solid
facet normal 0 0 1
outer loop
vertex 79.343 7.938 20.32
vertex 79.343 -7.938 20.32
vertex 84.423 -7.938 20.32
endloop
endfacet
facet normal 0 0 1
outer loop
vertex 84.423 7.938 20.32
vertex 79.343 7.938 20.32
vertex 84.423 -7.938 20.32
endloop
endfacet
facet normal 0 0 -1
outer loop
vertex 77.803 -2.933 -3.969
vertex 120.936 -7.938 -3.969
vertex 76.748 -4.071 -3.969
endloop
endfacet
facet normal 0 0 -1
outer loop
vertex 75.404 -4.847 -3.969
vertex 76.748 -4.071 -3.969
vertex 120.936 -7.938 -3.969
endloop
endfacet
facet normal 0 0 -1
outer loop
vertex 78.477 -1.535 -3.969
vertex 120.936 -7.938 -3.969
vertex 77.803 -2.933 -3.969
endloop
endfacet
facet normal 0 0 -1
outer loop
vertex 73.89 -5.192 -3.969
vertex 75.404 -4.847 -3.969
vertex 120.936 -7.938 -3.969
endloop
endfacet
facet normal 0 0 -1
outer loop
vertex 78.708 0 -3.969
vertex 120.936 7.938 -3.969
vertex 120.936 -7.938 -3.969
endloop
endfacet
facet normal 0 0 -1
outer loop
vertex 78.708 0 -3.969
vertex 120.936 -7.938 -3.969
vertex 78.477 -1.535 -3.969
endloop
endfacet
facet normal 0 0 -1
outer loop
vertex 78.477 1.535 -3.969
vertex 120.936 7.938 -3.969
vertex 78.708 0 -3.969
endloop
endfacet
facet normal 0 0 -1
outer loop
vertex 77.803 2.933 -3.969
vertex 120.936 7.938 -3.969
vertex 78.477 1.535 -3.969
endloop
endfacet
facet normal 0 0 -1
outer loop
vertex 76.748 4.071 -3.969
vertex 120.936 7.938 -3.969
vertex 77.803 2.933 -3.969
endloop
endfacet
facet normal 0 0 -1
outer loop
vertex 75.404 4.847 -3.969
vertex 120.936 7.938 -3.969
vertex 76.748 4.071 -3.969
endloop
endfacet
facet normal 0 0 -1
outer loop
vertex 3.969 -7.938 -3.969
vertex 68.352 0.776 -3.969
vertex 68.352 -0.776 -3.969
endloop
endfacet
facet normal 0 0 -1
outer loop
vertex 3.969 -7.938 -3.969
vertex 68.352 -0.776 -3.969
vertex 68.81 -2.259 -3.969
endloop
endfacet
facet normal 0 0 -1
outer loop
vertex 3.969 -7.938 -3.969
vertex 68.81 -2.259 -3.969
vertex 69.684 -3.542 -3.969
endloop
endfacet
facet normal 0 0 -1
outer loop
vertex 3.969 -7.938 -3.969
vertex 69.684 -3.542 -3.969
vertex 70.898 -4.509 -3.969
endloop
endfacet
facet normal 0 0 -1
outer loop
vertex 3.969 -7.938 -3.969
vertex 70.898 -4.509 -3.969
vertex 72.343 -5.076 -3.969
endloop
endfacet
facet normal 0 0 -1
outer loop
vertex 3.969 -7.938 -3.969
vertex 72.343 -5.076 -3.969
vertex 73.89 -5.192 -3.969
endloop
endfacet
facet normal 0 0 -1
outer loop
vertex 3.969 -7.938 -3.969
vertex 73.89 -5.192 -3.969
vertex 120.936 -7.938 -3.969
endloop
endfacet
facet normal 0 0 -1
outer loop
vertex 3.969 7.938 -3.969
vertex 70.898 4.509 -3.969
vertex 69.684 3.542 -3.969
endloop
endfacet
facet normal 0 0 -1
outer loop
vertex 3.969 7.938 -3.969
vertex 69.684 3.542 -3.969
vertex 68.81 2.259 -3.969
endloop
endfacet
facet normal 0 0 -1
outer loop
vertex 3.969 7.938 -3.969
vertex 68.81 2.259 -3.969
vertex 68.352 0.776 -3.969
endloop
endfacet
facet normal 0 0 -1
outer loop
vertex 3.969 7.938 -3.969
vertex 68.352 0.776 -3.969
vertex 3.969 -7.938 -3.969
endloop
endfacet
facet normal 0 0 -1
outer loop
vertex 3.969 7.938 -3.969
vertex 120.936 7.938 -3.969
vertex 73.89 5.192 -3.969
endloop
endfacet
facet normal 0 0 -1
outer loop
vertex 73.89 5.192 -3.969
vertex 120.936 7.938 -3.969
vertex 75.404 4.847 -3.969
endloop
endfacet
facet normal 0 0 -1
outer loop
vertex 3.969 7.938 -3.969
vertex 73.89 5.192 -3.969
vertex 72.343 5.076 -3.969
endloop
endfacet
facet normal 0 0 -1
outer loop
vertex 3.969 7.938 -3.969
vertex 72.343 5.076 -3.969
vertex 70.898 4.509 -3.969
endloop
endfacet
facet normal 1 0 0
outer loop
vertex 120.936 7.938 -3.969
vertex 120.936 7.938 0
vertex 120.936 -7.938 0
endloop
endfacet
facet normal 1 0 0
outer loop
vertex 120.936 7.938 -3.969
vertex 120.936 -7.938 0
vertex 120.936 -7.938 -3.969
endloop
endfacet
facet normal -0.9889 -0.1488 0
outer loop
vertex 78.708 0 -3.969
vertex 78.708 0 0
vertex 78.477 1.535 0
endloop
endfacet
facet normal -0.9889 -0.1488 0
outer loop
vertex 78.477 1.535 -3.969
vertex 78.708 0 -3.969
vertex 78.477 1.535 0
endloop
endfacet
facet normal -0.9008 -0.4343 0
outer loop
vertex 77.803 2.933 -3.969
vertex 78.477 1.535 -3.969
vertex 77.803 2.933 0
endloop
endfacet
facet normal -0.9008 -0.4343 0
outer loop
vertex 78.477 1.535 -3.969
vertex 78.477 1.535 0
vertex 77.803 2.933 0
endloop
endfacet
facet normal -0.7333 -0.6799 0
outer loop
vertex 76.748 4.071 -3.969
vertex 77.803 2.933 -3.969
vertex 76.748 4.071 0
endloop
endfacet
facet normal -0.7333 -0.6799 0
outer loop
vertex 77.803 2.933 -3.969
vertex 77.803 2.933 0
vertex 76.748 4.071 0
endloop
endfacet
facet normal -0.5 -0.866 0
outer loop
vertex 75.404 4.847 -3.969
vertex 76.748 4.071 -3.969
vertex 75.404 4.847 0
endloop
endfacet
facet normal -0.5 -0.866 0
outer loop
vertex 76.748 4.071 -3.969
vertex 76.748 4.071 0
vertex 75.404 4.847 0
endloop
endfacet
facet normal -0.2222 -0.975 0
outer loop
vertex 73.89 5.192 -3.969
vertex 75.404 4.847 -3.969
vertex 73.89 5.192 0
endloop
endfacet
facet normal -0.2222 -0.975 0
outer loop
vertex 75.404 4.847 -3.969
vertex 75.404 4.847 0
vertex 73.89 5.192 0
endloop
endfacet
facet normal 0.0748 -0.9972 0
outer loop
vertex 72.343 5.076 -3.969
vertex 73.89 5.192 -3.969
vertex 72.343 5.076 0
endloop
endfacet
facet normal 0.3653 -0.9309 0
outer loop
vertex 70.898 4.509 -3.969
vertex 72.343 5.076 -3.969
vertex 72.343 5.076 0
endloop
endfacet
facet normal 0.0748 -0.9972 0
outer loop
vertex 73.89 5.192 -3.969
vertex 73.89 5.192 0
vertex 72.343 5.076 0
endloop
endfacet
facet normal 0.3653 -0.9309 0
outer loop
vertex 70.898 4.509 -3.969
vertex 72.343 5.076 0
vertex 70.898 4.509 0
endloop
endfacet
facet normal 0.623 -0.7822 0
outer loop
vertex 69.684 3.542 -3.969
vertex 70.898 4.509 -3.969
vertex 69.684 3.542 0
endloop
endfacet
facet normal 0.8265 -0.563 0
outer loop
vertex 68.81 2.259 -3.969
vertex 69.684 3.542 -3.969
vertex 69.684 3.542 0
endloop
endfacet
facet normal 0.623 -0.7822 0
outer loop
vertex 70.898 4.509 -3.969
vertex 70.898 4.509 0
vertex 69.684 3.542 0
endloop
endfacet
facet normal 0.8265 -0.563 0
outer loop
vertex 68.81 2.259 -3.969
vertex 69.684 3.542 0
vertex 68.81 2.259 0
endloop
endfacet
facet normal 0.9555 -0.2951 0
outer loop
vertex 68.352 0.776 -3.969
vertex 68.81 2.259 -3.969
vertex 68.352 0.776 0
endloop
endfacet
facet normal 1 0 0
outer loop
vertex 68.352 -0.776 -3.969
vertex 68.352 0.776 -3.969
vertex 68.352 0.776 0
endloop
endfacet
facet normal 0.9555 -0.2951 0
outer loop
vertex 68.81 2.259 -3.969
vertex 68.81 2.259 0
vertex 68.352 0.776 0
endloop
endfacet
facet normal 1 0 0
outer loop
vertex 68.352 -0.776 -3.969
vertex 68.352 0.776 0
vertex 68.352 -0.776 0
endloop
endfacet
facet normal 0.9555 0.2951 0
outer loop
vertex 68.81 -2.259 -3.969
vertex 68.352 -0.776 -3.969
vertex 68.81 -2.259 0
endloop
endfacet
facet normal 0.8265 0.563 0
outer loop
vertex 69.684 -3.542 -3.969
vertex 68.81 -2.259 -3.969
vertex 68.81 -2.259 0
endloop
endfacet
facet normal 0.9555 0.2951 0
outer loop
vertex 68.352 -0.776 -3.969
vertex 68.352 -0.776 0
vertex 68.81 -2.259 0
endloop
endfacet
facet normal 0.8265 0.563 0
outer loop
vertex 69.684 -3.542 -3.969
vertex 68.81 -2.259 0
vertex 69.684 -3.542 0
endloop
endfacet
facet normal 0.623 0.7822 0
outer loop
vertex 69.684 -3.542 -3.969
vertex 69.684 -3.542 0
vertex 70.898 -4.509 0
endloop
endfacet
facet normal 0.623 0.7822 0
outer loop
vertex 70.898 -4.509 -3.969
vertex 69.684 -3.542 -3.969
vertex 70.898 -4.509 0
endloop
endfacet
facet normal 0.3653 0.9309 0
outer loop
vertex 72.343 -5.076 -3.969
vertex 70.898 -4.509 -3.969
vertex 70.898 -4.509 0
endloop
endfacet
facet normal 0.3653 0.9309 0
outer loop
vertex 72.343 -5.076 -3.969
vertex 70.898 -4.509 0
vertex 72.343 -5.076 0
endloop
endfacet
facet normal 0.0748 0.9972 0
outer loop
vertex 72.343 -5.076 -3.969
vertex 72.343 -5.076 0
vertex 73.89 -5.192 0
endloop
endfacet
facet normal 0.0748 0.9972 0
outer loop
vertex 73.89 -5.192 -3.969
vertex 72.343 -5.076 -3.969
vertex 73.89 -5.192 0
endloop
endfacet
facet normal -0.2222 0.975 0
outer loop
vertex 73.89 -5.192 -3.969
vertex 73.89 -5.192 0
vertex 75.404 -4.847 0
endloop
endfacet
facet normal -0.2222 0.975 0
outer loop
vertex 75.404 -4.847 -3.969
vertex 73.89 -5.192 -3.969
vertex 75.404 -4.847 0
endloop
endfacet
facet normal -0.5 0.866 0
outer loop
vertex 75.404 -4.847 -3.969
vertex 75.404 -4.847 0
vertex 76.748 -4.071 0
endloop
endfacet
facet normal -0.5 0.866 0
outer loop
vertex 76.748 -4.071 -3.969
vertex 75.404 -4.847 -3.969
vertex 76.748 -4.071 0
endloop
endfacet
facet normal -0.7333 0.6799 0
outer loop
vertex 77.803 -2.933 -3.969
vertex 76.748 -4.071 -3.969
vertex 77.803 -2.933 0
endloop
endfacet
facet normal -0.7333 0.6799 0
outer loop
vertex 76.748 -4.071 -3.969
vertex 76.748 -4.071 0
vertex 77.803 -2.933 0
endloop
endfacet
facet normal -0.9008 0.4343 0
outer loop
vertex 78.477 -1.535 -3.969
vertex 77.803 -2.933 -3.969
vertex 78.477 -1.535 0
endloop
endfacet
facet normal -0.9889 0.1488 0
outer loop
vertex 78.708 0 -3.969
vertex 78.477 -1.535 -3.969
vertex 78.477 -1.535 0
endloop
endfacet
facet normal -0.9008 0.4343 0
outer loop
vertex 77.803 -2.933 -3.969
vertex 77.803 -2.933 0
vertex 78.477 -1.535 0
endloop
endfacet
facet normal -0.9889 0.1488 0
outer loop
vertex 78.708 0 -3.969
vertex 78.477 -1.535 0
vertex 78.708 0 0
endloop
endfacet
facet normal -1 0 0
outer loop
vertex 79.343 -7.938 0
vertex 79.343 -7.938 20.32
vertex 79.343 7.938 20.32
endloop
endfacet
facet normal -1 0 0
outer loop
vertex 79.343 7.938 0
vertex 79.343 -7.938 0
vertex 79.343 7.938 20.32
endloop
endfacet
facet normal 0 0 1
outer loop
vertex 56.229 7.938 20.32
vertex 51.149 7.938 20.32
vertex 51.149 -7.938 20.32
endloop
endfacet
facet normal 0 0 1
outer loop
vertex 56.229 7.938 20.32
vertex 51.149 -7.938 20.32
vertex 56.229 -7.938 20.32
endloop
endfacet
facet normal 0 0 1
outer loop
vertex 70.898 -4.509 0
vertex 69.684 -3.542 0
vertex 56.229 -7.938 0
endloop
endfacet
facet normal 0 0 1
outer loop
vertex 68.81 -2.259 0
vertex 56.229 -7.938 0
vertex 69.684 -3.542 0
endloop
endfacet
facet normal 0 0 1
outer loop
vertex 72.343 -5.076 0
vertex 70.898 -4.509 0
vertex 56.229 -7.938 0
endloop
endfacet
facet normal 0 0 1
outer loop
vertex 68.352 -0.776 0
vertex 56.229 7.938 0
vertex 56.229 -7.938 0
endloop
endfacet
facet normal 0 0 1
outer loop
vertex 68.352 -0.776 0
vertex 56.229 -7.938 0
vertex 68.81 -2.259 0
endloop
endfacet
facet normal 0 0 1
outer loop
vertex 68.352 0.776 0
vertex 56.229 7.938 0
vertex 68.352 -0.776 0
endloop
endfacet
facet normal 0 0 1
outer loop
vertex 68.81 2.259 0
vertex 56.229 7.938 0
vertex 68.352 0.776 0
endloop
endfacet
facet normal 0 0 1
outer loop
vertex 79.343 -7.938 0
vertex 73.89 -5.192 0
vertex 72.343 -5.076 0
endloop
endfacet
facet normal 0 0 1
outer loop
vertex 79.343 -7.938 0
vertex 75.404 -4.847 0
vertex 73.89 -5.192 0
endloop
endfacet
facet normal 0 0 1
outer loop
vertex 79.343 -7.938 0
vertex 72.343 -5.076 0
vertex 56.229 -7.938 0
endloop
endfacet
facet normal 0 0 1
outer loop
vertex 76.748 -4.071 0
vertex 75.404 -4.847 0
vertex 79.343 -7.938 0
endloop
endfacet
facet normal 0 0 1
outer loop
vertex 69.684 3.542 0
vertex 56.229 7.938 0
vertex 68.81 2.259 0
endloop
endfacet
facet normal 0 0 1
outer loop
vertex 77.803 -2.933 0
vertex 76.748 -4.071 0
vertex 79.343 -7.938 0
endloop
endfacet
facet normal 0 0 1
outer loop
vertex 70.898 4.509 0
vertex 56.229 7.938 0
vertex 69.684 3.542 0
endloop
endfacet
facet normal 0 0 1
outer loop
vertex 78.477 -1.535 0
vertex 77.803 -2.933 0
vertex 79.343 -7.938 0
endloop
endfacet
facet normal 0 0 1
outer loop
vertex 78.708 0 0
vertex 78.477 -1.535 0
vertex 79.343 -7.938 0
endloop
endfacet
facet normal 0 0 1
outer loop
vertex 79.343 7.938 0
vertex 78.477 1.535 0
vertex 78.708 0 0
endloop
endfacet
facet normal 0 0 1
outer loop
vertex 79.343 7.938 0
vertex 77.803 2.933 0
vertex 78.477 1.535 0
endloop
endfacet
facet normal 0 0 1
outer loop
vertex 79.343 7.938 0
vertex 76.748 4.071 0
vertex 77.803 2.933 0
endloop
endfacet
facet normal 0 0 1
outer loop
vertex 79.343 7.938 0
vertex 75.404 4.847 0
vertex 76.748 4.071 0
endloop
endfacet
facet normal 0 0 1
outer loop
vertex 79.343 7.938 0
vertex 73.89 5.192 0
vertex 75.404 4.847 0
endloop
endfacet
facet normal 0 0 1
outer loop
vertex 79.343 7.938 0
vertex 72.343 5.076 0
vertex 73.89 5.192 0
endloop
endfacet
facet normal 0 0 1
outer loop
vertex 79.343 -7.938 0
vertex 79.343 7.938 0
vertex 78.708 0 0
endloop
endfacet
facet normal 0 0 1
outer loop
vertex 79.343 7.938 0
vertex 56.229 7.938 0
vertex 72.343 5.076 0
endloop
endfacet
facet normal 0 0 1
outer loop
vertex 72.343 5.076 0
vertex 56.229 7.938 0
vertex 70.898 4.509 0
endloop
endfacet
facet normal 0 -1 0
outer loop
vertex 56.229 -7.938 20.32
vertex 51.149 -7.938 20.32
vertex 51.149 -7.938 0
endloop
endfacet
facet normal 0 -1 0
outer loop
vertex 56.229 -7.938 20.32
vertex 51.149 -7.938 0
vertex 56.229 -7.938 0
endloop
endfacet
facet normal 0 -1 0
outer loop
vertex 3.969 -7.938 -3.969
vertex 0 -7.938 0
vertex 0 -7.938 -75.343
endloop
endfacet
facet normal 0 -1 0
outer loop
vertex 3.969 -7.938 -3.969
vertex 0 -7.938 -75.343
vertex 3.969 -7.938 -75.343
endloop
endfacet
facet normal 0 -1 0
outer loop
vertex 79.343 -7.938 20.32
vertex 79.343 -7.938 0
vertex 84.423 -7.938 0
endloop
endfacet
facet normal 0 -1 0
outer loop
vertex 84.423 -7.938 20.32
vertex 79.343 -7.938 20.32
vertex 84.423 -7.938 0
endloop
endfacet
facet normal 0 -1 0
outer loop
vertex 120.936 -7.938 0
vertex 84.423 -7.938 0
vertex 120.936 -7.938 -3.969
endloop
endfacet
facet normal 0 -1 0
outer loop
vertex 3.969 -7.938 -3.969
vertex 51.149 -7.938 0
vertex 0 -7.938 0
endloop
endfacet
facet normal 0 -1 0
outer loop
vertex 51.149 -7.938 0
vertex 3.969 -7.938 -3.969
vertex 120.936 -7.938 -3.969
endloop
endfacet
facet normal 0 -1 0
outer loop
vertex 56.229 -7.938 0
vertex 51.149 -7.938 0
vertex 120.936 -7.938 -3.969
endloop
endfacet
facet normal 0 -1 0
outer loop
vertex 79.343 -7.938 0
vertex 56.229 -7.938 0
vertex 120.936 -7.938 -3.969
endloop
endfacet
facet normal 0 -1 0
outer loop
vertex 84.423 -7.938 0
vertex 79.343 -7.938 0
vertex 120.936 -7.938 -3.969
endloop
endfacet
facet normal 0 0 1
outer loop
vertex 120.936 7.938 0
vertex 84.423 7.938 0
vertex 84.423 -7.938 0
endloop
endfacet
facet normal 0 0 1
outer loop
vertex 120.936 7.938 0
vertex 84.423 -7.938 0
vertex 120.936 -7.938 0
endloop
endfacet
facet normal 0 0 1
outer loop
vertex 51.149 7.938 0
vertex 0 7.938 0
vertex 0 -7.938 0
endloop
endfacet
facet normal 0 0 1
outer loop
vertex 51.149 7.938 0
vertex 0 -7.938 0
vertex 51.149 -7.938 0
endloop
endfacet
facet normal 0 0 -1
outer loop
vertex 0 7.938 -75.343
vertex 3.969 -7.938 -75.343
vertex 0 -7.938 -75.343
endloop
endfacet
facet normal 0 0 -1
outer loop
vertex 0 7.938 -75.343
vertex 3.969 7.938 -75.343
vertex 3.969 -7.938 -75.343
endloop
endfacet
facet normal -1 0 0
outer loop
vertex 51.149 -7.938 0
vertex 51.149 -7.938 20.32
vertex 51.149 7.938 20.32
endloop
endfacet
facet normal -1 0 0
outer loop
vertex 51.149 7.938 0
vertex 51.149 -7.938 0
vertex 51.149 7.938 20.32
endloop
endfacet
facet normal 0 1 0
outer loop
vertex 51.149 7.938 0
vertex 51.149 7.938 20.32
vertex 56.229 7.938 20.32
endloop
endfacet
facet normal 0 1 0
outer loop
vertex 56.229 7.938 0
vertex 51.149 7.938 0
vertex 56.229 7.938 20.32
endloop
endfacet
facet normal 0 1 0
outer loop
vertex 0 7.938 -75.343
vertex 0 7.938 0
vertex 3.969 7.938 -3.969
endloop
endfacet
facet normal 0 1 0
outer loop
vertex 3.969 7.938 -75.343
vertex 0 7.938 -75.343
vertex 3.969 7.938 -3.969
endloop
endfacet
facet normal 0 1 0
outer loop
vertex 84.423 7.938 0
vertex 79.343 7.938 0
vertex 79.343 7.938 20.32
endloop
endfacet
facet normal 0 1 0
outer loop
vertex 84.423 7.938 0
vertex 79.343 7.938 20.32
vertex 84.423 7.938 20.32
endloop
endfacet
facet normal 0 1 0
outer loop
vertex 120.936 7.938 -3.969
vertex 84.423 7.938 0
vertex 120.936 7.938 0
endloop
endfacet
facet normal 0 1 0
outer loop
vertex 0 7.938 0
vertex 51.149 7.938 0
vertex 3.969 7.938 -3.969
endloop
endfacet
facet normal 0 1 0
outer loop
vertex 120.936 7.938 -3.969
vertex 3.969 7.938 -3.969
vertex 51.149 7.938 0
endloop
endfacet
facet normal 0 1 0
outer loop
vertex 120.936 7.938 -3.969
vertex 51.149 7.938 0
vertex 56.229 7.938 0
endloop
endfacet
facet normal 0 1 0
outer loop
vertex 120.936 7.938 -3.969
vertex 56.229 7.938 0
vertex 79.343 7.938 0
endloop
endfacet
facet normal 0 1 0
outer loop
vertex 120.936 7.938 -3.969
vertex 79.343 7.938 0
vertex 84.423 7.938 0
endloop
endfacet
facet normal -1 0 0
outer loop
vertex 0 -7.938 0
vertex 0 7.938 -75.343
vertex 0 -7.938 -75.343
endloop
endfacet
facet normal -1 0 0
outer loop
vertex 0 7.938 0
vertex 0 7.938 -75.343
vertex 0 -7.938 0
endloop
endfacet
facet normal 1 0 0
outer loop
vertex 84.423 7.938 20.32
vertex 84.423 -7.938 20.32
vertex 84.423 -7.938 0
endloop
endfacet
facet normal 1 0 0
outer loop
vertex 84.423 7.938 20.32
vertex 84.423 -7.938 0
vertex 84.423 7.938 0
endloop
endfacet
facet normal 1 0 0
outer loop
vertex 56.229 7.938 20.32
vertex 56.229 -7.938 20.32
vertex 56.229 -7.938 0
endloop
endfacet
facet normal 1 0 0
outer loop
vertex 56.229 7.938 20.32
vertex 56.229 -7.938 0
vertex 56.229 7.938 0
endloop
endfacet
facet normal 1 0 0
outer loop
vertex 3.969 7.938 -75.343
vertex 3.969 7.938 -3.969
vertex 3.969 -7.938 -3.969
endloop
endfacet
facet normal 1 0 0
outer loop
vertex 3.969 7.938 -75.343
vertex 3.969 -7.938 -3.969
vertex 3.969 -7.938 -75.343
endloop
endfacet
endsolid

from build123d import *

# Parameters (mm, degrees)
BOSS_EXTRUDE1_DEPTH = 7.9375
SKETCH2_R           = 5.207
CUT_EXTRUDE1_DEPTH  = 3.96875
SKETCH4_W           = 5.08
SKETCH4_H           = 15.875
BOSS_EXTRUDE2_DEPTH = 20.32


with BuildPart() as part:
    # Sketch1 → Boss-Extrude1 (new, symmetric)
    with BuildSketch(Plane(origin=(0, 0, 0), x_dir=(1, 0, 0), z_dir=(0, 1, 0))):
        Polygon((0, 0), (3.96875, 0), (120.93575, 0), (120.93575, 3.96875), (3.96875, 3.96875), (3.96875, 75.34275), (0, 75.34275), align=None)
    extrude(amount=BOSS_EXTRUDE1_DEPTH, both=True)

    # Sketch2 → Cut-Extrude1 (cut)
    with BuildSketch(Plane.XY):
        with Locations((73.50125, 0)):
            Circle(SKETCH2_R)
    extrude(amount=-CUT_EXTRUDE1_DEPTH, mode=Mode.SUBTRACT)

    # Sketch4 → Boss-Extrude2 (add)
    with BuildSketch(Plane.XY):
        with Locations((53.68925, 0)):
            Rectangle(SKETCH4_W, SKETCH4_H)
        with Locations((81.88325, 0)):
            Rectangle(SKETCH4_W, SKETCH4_H)
    extrude(amount=BOSS_EXTRUDE2_DEPTH)


solid = part.part
